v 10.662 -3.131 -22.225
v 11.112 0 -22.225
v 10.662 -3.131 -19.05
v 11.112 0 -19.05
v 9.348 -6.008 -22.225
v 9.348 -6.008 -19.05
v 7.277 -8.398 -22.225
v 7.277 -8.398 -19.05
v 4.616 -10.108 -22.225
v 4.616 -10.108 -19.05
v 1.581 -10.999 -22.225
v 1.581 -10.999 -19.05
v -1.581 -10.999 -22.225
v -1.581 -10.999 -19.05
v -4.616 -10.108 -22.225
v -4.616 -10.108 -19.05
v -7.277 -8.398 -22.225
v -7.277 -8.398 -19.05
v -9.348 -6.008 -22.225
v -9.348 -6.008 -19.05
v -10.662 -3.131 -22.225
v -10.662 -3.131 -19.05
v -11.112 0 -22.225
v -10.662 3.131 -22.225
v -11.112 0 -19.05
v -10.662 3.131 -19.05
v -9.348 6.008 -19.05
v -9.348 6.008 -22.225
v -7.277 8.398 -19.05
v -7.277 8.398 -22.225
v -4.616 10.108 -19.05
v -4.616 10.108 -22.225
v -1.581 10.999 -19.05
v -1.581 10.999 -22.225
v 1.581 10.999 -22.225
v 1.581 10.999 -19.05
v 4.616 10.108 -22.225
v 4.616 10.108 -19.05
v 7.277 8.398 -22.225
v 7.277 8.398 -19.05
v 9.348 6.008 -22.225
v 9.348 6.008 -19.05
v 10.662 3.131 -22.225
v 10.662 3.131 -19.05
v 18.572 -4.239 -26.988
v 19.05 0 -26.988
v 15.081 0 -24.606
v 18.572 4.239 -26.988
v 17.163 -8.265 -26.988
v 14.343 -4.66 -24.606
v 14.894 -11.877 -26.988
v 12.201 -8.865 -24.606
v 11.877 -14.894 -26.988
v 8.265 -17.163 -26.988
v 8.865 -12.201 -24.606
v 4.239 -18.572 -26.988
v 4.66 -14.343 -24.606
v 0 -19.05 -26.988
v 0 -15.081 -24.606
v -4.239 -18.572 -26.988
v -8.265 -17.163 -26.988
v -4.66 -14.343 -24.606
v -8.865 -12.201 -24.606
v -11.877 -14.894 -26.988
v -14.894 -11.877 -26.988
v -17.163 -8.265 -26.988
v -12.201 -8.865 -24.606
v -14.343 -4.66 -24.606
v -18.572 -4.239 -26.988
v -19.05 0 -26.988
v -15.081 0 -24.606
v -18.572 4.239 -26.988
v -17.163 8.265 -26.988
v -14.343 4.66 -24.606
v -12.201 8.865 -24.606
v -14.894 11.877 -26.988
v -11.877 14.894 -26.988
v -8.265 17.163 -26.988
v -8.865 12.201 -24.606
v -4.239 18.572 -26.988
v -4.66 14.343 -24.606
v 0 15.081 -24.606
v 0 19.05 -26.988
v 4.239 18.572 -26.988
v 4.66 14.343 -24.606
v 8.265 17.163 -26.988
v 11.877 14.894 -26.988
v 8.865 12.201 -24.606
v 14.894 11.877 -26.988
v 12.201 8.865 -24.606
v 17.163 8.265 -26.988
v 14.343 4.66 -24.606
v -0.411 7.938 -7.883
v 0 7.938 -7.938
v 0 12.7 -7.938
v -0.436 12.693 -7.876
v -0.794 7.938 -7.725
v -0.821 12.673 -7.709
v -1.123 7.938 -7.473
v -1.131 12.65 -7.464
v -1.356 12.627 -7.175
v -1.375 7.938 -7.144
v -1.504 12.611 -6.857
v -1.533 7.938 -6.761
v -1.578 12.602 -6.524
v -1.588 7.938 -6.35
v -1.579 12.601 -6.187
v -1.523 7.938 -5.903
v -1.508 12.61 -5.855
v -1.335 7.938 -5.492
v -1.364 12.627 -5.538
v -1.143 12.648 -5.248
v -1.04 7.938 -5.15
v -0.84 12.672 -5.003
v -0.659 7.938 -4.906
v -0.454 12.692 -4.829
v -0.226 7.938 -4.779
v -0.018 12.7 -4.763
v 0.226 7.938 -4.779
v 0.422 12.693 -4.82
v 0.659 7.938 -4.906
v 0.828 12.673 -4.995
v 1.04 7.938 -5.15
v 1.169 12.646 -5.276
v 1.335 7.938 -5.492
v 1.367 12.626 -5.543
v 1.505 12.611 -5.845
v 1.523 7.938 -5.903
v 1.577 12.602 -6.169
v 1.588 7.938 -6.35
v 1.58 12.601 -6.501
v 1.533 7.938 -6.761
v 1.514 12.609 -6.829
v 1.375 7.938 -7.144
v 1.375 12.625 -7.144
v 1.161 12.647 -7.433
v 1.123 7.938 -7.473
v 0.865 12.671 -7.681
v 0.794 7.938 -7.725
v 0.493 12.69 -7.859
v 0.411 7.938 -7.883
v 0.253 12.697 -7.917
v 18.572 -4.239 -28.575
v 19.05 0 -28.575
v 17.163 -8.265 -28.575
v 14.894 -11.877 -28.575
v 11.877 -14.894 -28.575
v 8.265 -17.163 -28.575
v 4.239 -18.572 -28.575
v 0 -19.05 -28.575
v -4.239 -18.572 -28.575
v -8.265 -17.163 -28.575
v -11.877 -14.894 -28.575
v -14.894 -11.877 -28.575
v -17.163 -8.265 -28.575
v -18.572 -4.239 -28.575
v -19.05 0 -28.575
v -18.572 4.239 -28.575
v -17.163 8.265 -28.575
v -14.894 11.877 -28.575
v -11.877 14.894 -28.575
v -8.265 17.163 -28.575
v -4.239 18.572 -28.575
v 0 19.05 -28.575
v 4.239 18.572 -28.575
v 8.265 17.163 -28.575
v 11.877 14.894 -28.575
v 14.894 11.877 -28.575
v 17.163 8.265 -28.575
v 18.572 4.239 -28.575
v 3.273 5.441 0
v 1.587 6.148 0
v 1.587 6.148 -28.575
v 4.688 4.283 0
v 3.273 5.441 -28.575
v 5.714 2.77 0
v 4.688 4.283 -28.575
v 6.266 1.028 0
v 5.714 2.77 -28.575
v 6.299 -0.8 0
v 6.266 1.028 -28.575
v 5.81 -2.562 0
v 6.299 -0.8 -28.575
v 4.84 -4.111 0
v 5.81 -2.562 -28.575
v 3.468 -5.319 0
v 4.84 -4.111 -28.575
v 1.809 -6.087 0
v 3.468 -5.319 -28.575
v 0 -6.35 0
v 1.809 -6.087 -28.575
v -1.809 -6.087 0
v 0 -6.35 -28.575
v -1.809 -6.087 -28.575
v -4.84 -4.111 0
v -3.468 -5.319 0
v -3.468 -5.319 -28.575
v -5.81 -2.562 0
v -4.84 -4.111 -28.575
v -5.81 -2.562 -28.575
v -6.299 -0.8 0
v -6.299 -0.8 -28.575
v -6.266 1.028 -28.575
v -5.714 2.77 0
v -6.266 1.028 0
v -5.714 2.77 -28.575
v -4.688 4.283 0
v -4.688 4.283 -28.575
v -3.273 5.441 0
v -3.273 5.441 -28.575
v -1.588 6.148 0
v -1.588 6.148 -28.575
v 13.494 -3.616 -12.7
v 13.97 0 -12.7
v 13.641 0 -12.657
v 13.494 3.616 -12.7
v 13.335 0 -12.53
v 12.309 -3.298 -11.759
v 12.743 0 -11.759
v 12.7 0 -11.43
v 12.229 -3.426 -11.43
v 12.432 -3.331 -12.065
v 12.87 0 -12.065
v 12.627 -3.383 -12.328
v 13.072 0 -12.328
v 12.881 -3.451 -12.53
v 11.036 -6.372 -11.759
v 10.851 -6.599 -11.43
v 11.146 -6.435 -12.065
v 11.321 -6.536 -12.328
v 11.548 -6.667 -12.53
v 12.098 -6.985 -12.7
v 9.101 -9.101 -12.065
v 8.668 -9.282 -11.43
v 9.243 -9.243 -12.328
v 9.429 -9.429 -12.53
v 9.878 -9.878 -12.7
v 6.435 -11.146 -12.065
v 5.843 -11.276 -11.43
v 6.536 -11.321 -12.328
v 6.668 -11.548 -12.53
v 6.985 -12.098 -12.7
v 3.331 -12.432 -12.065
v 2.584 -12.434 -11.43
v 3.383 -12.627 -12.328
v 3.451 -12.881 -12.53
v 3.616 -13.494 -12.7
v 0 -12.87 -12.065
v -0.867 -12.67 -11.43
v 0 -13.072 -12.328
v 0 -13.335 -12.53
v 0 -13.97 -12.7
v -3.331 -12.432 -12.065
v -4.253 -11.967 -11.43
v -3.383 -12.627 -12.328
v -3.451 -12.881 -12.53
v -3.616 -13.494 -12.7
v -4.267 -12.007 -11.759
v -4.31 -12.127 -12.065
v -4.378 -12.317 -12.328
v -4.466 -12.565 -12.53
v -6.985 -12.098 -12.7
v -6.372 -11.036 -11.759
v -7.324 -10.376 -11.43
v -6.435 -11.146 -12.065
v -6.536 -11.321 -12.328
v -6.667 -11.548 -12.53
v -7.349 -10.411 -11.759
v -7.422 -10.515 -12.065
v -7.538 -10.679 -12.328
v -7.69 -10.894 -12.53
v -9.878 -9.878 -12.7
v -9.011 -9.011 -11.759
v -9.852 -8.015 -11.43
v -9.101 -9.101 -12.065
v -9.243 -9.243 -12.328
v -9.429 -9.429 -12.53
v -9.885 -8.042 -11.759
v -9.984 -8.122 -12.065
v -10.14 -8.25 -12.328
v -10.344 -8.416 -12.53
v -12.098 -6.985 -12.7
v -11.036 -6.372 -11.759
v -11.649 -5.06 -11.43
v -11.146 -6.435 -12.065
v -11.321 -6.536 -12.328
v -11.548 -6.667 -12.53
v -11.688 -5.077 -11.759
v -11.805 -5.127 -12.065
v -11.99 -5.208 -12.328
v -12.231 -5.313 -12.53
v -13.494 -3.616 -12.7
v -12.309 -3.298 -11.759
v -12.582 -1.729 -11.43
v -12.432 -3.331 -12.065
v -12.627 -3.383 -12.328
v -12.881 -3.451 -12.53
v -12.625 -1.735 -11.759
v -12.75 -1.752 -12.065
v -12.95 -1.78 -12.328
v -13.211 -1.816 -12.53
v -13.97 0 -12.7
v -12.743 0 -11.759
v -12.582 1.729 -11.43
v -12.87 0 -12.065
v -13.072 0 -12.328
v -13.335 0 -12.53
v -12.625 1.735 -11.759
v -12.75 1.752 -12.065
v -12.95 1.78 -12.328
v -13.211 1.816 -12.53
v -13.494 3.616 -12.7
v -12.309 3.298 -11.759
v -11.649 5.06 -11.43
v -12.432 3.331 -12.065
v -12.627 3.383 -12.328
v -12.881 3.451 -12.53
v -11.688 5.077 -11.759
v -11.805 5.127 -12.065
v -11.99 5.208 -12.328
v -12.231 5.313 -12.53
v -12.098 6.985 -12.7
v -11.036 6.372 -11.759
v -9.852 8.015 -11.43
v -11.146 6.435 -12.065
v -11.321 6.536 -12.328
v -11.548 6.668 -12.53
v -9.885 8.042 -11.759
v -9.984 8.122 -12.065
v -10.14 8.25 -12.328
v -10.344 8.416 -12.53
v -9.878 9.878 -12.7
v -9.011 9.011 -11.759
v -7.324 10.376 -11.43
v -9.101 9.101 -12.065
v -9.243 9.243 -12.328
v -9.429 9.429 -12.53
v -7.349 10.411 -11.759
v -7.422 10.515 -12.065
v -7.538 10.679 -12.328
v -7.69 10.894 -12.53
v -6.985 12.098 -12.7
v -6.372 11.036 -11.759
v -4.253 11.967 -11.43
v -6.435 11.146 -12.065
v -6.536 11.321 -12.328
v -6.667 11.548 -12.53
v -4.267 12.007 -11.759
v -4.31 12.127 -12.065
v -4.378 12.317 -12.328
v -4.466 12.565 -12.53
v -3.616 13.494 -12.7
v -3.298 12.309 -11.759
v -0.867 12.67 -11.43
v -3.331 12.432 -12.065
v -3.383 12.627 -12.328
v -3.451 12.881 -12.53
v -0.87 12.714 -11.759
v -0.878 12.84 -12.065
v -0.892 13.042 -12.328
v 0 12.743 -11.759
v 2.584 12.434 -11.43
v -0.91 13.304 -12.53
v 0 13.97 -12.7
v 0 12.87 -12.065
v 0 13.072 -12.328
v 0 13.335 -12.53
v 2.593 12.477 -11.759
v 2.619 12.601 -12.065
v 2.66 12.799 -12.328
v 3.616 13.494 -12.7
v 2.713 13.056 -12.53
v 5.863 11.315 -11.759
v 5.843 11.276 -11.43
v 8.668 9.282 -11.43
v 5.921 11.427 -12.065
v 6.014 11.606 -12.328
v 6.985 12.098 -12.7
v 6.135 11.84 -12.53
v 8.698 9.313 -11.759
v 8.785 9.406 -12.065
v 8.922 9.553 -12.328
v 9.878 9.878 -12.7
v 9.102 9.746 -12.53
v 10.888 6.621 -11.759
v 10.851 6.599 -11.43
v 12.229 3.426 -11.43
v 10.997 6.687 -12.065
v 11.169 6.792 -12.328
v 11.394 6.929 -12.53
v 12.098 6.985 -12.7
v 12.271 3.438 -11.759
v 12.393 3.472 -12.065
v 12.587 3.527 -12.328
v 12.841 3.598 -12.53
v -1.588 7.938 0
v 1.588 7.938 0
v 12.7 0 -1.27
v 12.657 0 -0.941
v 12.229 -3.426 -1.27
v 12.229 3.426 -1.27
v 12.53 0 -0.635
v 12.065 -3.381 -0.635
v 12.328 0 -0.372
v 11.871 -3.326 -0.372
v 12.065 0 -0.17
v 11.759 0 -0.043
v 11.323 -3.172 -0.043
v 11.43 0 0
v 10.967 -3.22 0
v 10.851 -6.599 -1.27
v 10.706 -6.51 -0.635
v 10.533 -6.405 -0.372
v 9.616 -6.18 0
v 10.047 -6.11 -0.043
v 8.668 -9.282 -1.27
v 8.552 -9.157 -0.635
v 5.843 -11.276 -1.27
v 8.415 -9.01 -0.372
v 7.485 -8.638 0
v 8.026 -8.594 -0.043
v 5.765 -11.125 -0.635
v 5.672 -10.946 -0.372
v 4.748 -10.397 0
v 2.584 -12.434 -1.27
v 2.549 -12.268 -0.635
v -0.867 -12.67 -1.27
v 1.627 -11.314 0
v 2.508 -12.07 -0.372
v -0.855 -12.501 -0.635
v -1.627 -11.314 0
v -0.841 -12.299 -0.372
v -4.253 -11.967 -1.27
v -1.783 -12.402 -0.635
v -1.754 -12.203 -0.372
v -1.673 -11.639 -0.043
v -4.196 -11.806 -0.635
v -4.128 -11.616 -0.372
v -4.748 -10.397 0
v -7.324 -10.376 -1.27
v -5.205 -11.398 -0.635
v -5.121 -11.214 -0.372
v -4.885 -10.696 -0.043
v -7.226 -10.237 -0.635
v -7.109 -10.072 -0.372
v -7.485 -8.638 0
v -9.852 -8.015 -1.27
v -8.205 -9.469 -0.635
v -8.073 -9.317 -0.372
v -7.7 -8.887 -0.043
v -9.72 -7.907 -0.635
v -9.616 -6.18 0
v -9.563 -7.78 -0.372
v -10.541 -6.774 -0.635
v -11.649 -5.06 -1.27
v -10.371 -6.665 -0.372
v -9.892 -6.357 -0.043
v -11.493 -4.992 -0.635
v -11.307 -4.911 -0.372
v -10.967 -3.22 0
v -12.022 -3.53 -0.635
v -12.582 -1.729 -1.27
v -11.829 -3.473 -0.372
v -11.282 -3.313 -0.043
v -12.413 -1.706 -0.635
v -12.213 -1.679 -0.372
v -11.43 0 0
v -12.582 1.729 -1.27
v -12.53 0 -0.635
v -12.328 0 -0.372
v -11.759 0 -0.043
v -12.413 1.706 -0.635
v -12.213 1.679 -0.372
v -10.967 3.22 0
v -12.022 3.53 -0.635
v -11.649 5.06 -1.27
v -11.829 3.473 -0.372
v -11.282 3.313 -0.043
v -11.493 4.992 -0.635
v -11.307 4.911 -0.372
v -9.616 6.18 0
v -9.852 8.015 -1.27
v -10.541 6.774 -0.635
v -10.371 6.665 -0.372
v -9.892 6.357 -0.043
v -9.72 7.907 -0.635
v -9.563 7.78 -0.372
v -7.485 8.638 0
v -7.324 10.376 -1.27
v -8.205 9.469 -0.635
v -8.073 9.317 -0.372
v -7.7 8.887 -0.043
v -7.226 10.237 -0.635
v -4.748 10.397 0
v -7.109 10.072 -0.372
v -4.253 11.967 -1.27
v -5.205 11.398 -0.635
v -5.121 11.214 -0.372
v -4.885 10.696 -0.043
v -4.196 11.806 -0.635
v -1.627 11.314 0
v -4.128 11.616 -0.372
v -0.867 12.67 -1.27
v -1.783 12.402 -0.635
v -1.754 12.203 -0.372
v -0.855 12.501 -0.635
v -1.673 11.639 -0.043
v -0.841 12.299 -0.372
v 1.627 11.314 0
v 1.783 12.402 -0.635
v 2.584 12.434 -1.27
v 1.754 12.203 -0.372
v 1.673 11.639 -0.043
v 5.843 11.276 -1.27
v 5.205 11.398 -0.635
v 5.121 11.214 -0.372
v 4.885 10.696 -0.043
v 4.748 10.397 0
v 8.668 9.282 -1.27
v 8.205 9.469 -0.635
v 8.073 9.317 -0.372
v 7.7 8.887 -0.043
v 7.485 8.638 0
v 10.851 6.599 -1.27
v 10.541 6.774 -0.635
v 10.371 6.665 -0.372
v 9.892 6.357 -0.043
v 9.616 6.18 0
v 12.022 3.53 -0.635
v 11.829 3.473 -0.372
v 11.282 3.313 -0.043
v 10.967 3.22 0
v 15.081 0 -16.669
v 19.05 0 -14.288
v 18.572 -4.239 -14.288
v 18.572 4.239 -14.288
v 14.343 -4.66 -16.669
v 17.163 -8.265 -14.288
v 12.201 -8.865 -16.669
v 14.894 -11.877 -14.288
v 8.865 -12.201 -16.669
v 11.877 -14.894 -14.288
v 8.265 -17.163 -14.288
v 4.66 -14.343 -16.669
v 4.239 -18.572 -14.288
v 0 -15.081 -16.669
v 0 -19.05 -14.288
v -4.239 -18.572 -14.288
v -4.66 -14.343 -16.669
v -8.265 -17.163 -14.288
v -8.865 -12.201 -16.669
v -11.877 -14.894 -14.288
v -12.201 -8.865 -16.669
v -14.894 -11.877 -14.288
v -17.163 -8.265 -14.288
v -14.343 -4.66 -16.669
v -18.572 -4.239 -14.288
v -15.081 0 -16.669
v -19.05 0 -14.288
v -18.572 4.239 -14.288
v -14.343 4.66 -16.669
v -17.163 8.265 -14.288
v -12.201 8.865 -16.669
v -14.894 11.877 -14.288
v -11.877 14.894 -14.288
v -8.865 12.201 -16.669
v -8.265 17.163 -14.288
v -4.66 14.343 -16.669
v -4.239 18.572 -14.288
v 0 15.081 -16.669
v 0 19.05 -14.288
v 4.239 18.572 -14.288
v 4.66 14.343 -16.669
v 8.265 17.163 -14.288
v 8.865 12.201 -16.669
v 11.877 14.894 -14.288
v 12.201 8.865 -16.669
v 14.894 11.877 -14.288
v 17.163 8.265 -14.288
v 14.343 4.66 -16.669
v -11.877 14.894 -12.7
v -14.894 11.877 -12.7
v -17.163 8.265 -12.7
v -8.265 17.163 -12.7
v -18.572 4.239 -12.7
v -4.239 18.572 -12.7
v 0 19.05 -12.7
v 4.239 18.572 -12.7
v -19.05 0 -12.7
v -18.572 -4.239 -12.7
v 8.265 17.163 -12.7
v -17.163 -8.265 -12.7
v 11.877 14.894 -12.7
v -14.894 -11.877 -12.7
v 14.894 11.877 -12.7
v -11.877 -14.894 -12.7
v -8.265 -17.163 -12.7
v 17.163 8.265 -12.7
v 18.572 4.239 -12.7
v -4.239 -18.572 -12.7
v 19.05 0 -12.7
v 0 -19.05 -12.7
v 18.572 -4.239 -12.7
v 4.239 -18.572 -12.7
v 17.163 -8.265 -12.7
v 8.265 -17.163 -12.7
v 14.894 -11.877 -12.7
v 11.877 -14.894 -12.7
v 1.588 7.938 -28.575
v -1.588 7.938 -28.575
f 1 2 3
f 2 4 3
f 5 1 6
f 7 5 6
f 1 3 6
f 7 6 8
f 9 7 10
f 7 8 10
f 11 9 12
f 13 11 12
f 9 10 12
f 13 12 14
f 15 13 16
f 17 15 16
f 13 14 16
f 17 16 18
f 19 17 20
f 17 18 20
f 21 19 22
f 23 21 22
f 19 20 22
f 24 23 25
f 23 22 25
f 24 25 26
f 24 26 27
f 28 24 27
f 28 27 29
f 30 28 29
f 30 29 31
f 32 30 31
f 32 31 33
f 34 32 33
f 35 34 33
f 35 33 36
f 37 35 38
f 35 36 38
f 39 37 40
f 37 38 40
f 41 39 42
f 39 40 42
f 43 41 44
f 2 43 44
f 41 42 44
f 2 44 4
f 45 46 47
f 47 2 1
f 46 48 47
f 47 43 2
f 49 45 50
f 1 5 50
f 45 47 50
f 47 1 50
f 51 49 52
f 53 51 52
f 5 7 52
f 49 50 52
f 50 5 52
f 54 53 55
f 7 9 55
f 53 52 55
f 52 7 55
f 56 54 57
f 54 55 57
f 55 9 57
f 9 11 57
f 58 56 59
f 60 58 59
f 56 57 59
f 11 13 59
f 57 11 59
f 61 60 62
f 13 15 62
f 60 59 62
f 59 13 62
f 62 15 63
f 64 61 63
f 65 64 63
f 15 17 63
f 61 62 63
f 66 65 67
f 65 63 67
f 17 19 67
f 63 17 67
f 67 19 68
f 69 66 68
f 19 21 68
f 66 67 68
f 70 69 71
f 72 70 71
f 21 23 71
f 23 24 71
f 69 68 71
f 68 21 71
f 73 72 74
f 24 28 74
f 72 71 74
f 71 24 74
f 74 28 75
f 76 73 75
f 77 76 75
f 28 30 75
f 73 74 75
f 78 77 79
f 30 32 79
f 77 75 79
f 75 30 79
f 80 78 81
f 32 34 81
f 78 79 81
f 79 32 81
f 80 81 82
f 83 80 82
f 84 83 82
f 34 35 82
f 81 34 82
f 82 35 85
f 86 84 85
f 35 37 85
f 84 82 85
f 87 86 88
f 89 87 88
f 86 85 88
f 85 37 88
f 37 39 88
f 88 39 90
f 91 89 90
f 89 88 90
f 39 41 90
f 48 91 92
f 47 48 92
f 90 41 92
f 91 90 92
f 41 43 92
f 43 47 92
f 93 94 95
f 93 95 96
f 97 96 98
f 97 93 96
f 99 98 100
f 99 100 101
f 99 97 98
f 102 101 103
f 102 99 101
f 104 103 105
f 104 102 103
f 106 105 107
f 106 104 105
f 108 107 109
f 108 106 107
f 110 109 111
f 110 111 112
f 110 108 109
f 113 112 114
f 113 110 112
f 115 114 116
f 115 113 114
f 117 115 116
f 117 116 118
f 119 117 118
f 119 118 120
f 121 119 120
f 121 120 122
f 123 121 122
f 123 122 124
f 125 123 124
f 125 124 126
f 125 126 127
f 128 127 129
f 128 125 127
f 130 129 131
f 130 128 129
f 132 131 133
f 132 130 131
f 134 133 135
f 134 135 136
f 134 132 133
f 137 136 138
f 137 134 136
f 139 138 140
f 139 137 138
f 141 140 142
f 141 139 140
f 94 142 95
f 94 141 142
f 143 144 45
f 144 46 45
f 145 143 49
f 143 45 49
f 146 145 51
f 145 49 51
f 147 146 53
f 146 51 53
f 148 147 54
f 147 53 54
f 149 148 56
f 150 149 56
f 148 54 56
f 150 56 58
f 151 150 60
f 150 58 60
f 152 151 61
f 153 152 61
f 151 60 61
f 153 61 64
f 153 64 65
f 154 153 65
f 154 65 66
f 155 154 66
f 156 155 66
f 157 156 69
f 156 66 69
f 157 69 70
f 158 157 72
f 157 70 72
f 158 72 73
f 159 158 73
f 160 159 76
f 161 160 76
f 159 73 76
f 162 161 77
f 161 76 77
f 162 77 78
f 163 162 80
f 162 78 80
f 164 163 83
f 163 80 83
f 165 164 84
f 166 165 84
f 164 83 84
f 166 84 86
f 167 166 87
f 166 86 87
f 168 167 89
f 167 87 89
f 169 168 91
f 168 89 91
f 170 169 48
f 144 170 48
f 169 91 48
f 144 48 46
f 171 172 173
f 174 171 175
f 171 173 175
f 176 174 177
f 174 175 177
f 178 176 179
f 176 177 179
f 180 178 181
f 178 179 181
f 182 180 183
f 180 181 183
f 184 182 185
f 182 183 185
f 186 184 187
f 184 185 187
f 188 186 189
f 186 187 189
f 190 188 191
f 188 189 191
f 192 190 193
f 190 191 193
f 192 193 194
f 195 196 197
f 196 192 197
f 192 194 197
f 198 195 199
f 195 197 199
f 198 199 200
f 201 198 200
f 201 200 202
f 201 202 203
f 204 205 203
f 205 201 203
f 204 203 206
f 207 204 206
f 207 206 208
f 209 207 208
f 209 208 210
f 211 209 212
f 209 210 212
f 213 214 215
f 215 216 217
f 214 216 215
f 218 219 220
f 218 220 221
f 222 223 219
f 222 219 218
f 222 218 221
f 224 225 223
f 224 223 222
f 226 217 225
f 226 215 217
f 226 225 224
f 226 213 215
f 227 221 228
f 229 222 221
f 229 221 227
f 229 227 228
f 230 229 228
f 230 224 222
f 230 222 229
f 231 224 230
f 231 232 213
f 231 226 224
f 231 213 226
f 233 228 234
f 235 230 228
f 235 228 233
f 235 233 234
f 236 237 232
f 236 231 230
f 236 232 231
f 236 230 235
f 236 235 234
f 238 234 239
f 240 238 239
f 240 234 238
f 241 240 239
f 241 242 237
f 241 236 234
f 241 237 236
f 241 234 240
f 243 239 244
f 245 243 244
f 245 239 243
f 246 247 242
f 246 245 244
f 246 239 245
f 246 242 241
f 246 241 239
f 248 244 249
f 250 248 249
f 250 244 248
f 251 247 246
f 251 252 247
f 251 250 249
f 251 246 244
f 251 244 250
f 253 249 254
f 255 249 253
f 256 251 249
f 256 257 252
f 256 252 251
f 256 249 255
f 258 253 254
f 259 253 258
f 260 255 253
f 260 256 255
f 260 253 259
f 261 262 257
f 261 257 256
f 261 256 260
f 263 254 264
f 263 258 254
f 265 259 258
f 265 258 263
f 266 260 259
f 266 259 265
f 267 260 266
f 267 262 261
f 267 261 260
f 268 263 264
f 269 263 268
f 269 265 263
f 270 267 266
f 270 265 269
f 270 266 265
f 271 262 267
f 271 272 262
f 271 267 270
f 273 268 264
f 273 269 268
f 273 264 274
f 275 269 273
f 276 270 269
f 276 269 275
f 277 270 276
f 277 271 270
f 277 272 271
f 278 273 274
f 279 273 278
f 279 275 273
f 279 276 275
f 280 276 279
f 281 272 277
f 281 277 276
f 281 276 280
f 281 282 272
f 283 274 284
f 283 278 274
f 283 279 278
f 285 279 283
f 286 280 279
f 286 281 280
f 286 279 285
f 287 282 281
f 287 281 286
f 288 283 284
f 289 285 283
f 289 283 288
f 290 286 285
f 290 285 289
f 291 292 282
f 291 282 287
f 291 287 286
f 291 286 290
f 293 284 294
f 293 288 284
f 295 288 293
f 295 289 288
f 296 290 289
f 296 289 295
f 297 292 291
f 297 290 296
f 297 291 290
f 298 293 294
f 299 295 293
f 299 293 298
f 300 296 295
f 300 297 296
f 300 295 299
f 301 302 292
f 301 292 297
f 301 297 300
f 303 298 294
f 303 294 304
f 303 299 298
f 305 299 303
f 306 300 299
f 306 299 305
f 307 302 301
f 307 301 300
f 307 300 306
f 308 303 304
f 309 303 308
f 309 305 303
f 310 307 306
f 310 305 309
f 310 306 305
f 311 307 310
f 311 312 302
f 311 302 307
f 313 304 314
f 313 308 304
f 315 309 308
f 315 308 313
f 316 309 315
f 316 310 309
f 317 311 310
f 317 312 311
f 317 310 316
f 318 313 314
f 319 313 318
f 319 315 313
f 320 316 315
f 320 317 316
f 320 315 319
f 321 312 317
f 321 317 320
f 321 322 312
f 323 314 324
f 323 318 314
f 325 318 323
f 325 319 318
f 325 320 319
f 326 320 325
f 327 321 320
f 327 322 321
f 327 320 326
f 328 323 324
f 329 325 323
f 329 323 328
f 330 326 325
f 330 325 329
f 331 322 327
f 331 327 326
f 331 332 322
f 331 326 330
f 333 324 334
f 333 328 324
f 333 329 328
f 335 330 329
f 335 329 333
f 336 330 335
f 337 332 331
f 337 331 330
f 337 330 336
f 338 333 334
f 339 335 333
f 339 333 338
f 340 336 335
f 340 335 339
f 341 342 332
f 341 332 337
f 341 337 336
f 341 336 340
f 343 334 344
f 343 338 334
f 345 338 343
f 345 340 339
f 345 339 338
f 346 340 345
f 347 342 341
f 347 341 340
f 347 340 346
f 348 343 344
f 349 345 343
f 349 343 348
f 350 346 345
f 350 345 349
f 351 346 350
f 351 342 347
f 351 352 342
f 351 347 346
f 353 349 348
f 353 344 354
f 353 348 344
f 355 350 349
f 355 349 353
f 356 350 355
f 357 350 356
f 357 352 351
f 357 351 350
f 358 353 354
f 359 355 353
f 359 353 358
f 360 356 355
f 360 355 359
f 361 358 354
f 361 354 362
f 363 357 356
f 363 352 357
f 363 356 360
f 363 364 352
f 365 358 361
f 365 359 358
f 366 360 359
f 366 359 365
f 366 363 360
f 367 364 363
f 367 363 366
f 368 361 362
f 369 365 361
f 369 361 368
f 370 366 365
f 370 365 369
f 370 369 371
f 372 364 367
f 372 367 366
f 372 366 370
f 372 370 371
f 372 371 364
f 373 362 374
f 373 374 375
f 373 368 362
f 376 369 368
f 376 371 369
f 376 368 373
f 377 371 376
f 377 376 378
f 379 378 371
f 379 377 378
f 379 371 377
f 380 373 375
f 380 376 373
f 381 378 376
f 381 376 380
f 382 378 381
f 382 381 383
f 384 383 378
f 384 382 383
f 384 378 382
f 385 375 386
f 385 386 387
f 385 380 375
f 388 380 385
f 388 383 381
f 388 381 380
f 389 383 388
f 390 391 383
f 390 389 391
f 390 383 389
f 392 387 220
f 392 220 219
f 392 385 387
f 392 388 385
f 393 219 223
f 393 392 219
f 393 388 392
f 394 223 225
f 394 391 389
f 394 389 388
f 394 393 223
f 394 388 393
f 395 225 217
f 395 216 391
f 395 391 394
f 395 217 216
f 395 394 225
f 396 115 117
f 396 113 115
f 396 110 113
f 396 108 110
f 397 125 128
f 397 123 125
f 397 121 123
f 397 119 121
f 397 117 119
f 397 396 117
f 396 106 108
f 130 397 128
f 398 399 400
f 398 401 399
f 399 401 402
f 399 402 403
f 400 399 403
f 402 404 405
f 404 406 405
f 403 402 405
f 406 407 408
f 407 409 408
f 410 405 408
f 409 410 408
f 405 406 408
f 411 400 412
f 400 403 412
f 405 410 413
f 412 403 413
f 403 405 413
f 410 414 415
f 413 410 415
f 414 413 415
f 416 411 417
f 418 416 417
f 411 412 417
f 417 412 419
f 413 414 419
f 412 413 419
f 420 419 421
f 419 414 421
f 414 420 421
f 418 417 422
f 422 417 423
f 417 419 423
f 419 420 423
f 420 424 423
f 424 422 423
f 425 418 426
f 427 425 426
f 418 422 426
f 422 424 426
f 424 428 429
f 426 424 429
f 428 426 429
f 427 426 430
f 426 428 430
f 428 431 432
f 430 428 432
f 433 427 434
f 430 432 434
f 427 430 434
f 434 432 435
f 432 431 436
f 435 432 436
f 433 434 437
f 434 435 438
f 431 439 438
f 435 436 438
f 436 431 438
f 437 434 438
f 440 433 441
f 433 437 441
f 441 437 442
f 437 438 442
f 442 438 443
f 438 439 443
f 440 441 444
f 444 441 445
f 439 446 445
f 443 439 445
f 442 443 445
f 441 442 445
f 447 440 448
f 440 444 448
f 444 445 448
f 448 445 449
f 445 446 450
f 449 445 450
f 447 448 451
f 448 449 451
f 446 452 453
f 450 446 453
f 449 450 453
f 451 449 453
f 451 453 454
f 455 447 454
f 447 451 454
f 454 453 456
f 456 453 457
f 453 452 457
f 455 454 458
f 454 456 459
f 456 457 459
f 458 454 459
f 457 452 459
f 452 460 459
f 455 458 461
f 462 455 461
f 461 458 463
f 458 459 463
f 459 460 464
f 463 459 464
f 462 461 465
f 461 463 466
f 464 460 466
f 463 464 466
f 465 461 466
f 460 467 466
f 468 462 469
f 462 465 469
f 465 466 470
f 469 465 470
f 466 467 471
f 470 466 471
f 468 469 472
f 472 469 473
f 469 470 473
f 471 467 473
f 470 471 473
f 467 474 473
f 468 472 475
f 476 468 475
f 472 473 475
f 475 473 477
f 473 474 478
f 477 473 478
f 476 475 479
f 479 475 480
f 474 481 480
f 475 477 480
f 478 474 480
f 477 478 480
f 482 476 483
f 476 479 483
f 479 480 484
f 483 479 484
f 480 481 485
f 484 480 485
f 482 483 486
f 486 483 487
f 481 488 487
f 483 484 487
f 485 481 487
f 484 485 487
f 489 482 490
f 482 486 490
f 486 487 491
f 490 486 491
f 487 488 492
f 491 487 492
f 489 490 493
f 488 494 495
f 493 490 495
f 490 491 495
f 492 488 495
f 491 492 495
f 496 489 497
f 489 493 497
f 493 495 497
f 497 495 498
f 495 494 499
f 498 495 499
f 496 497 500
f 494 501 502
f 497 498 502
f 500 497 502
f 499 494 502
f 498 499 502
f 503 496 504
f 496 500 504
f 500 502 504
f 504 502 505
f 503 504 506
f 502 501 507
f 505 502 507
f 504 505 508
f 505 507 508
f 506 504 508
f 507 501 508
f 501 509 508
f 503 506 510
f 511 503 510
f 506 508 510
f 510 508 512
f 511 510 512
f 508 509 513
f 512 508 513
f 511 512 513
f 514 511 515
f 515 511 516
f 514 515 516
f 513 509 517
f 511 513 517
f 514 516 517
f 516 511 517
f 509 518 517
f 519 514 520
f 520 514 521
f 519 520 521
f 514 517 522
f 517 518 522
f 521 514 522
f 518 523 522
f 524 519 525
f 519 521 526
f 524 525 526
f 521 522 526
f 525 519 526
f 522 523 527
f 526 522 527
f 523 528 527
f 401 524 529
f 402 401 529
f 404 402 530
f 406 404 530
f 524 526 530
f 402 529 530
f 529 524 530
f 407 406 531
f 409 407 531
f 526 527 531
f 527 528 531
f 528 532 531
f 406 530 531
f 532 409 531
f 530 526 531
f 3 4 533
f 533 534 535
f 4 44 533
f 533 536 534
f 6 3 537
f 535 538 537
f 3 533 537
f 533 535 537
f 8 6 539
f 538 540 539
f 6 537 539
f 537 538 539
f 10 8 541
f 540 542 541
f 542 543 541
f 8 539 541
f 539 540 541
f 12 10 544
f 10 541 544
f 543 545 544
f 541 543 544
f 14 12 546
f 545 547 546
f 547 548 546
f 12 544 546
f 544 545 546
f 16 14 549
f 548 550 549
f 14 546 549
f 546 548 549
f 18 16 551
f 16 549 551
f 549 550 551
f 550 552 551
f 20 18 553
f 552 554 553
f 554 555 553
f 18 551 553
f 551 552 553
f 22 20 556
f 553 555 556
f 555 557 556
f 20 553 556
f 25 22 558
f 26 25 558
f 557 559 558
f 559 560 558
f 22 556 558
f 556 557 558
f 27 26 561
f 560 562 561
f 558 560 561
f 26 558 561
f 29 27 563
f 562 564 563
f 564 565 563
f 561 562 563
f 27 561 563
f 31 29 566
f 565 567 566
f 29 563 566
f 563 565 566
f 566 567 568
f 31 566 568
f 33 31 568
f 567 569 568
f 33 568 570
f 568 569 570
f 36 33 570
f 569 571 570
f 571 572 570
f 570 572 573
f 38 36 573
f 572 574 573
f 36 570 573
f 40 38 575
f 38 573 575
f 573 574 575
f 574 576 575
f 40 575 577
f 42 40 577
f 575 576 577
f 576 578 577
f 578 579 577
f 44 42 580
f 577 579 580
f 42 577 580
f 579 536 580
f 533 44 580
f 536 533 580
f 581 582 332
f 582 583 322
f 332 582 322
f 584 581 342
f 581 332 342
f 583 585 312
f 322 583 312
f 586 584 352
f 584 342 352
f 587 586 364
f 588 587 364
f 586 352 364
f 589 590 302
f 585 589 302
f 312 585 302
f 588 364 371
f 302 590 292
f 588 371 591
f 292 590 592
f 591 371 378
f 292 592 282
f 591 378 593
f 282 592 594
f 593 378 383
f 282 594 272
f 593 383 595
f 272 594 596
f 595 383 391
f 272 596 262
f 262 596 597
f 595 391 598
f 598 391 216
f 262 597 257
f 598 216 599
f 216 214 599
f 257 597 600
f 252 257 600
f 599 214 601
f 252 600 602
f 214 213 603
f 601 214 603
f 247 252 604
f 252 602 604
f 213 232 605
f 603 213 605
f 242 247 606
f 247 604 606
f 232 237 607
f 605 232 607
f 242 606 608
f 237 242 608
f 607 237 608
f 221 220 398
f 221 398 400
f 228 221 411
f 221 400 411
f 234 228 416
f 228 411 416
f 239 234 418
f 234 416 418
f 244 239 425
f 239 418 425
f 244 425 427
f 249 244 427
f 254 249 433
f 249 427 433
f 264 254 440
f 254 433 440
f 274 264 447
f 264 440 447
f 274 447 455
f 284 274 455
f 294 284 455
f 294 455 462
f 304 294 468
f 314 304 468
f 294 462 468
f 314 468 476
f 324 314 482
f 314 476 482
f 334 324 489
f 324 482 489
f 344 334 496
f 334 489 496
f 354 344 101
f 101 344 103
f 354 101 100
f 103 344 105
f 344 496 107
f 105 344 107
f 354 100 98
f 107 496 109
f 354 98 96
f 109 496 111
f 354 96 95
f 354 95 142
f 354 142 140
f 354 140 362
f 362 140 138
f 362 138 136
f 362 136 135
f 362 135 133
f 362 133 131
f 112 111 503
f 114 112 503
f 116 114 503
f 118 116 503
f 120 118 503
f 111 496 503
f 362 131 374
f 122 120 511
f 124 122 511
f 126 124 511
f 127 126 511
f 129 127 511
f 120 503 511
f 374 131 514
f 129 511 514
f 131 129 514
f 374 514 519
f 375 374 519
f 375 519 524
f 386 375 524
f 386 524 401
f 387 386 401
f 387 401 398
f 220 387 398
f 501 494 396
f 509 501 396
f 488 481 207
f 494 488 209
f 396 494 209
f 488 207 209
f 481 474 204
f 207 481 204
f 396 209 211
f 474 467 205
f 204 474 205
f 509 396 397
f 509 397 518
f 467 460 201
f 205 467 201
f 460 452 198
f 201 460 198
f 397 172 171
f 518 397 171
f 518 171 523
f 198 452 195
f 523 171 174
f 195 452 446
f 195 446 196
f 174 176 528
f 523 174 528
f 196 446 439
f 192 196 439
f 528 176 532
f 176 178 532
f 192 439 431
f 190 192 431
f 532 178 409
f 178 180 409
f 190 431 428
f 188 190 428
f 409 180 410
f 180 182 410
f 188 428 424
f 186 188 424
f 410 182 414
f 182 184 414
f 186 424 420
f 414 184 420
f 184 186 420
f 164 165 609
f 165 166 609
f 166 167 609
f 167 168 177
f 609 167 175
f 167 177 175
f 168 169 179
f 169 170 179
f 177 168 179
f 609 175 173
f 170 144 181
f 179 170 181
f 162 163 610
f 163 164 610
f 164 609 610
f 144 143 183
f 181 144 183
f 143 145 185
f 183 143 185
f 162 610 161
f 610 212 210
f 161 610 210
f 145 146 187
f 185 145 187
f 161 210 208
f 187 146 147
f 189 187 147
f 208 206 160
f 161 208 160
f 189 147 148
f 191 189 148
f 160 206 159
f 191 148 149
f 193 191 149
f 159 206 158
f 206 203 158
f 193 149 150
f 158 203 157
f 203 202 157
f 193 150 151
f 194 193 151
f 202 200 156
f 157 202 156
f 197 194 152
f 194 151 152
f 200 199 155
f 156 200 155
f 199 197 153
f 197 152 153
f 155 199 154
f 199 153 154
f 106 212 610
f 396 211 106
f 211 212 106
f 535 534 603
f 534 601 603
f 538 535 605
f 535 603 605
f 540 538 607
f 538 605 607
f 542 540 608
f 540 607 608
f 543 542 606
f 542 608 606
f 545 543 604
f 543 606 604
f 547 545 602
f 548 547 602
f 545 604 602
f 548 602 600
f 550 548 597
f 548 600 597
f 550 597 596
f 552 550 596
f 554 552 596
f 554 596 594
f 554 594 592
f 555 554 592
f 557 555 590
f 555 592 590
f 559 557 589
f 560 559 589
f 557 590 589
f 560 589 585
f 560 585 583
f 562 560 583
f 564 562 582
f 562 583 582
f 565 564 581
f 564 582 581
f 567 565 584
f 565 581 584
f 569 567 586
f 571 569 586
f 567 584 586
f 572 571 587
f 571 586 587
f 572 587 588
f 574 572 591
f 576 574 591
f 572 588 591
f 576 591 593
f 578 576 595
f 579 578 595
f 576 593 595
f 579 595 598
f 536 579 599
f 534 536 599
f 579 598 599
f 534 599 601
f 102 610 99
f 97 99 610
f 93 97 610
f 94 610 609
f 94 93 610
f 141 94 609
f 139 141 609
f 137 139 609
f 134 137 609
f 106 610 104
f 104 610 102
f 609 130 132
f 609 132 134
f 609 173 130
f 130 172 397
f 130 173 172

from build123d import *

# Parameters (mm, degrees)
SKETCH4_W          = 3.175
SKETCH4_H          = 3.175
CUT_EXTRUDE2_DEPTH = 40.272581084
SKETCH5_R          = 1.5875
CUT_EXTRUDE3_DEPTH = 40.272581084
FILLET1_R          = 1.27


with BuildPart() as part:
    # Sketch3 → Revolve2 (revolve)
    with BuildSketch(Plane(origin=(0, 0, 0), x_dir=(0, 0, -1), z_dir=(1, 0, 0)), mode=Mode.PRIVATE) as revolve2_sk:
        Polygon((0, 6.35), (28.575, 6.35), (28.575, 19.05), (26.9875, 19.05), (22.225, 11.1125), (19.05, 11.1125), (14.2875, 19.05), (12.7, 19.05), (12.7, 12.7), (0, 12.7), align=None)
    revolve(revolve2_sk.sketch.rotate(Axis((0, 0, 0), (0, 0, -1)), 90), axis=Axis((0, 0, 0), (0, 0, -1)))

    # Sketch4 → Cut-Extrude2 (cut, through all)
    with BuildSketch(Plane.XY):
        with Locations((0, 6.35)):
            Rectangle(SKETCH4_W, SKETCH4_H)
    extrude(amount=-CUT_EXTRUDE2_DEPTH, mode=Mode.SUBTRACT)

    # Sketch5 → Cut-Extrude3 (cut, through all)
    with BuildSketch(Plane(origin=(0, 0, 0), x_dir=(1, 0, 0), z_dir=(0, 1, 0))):
        with Locations(Location((0, 6.35, 0), (0, 0, 90))):
            Circle(SKETCH5_R)
    extrude(amount=CUT_EXTRUDE3_DEPTH, mode=Mode.SUBTRACT)

    # Fillet1
    fillet1_edges = [part.edges().sort_by_distance(p)[0] for p in [
        (-12.7, 0, -12.7),
        (-12.7, 0, 0),
    ]]
    fillet(fillet1_edges, radius=FILLET1_R)


solid = part.part
